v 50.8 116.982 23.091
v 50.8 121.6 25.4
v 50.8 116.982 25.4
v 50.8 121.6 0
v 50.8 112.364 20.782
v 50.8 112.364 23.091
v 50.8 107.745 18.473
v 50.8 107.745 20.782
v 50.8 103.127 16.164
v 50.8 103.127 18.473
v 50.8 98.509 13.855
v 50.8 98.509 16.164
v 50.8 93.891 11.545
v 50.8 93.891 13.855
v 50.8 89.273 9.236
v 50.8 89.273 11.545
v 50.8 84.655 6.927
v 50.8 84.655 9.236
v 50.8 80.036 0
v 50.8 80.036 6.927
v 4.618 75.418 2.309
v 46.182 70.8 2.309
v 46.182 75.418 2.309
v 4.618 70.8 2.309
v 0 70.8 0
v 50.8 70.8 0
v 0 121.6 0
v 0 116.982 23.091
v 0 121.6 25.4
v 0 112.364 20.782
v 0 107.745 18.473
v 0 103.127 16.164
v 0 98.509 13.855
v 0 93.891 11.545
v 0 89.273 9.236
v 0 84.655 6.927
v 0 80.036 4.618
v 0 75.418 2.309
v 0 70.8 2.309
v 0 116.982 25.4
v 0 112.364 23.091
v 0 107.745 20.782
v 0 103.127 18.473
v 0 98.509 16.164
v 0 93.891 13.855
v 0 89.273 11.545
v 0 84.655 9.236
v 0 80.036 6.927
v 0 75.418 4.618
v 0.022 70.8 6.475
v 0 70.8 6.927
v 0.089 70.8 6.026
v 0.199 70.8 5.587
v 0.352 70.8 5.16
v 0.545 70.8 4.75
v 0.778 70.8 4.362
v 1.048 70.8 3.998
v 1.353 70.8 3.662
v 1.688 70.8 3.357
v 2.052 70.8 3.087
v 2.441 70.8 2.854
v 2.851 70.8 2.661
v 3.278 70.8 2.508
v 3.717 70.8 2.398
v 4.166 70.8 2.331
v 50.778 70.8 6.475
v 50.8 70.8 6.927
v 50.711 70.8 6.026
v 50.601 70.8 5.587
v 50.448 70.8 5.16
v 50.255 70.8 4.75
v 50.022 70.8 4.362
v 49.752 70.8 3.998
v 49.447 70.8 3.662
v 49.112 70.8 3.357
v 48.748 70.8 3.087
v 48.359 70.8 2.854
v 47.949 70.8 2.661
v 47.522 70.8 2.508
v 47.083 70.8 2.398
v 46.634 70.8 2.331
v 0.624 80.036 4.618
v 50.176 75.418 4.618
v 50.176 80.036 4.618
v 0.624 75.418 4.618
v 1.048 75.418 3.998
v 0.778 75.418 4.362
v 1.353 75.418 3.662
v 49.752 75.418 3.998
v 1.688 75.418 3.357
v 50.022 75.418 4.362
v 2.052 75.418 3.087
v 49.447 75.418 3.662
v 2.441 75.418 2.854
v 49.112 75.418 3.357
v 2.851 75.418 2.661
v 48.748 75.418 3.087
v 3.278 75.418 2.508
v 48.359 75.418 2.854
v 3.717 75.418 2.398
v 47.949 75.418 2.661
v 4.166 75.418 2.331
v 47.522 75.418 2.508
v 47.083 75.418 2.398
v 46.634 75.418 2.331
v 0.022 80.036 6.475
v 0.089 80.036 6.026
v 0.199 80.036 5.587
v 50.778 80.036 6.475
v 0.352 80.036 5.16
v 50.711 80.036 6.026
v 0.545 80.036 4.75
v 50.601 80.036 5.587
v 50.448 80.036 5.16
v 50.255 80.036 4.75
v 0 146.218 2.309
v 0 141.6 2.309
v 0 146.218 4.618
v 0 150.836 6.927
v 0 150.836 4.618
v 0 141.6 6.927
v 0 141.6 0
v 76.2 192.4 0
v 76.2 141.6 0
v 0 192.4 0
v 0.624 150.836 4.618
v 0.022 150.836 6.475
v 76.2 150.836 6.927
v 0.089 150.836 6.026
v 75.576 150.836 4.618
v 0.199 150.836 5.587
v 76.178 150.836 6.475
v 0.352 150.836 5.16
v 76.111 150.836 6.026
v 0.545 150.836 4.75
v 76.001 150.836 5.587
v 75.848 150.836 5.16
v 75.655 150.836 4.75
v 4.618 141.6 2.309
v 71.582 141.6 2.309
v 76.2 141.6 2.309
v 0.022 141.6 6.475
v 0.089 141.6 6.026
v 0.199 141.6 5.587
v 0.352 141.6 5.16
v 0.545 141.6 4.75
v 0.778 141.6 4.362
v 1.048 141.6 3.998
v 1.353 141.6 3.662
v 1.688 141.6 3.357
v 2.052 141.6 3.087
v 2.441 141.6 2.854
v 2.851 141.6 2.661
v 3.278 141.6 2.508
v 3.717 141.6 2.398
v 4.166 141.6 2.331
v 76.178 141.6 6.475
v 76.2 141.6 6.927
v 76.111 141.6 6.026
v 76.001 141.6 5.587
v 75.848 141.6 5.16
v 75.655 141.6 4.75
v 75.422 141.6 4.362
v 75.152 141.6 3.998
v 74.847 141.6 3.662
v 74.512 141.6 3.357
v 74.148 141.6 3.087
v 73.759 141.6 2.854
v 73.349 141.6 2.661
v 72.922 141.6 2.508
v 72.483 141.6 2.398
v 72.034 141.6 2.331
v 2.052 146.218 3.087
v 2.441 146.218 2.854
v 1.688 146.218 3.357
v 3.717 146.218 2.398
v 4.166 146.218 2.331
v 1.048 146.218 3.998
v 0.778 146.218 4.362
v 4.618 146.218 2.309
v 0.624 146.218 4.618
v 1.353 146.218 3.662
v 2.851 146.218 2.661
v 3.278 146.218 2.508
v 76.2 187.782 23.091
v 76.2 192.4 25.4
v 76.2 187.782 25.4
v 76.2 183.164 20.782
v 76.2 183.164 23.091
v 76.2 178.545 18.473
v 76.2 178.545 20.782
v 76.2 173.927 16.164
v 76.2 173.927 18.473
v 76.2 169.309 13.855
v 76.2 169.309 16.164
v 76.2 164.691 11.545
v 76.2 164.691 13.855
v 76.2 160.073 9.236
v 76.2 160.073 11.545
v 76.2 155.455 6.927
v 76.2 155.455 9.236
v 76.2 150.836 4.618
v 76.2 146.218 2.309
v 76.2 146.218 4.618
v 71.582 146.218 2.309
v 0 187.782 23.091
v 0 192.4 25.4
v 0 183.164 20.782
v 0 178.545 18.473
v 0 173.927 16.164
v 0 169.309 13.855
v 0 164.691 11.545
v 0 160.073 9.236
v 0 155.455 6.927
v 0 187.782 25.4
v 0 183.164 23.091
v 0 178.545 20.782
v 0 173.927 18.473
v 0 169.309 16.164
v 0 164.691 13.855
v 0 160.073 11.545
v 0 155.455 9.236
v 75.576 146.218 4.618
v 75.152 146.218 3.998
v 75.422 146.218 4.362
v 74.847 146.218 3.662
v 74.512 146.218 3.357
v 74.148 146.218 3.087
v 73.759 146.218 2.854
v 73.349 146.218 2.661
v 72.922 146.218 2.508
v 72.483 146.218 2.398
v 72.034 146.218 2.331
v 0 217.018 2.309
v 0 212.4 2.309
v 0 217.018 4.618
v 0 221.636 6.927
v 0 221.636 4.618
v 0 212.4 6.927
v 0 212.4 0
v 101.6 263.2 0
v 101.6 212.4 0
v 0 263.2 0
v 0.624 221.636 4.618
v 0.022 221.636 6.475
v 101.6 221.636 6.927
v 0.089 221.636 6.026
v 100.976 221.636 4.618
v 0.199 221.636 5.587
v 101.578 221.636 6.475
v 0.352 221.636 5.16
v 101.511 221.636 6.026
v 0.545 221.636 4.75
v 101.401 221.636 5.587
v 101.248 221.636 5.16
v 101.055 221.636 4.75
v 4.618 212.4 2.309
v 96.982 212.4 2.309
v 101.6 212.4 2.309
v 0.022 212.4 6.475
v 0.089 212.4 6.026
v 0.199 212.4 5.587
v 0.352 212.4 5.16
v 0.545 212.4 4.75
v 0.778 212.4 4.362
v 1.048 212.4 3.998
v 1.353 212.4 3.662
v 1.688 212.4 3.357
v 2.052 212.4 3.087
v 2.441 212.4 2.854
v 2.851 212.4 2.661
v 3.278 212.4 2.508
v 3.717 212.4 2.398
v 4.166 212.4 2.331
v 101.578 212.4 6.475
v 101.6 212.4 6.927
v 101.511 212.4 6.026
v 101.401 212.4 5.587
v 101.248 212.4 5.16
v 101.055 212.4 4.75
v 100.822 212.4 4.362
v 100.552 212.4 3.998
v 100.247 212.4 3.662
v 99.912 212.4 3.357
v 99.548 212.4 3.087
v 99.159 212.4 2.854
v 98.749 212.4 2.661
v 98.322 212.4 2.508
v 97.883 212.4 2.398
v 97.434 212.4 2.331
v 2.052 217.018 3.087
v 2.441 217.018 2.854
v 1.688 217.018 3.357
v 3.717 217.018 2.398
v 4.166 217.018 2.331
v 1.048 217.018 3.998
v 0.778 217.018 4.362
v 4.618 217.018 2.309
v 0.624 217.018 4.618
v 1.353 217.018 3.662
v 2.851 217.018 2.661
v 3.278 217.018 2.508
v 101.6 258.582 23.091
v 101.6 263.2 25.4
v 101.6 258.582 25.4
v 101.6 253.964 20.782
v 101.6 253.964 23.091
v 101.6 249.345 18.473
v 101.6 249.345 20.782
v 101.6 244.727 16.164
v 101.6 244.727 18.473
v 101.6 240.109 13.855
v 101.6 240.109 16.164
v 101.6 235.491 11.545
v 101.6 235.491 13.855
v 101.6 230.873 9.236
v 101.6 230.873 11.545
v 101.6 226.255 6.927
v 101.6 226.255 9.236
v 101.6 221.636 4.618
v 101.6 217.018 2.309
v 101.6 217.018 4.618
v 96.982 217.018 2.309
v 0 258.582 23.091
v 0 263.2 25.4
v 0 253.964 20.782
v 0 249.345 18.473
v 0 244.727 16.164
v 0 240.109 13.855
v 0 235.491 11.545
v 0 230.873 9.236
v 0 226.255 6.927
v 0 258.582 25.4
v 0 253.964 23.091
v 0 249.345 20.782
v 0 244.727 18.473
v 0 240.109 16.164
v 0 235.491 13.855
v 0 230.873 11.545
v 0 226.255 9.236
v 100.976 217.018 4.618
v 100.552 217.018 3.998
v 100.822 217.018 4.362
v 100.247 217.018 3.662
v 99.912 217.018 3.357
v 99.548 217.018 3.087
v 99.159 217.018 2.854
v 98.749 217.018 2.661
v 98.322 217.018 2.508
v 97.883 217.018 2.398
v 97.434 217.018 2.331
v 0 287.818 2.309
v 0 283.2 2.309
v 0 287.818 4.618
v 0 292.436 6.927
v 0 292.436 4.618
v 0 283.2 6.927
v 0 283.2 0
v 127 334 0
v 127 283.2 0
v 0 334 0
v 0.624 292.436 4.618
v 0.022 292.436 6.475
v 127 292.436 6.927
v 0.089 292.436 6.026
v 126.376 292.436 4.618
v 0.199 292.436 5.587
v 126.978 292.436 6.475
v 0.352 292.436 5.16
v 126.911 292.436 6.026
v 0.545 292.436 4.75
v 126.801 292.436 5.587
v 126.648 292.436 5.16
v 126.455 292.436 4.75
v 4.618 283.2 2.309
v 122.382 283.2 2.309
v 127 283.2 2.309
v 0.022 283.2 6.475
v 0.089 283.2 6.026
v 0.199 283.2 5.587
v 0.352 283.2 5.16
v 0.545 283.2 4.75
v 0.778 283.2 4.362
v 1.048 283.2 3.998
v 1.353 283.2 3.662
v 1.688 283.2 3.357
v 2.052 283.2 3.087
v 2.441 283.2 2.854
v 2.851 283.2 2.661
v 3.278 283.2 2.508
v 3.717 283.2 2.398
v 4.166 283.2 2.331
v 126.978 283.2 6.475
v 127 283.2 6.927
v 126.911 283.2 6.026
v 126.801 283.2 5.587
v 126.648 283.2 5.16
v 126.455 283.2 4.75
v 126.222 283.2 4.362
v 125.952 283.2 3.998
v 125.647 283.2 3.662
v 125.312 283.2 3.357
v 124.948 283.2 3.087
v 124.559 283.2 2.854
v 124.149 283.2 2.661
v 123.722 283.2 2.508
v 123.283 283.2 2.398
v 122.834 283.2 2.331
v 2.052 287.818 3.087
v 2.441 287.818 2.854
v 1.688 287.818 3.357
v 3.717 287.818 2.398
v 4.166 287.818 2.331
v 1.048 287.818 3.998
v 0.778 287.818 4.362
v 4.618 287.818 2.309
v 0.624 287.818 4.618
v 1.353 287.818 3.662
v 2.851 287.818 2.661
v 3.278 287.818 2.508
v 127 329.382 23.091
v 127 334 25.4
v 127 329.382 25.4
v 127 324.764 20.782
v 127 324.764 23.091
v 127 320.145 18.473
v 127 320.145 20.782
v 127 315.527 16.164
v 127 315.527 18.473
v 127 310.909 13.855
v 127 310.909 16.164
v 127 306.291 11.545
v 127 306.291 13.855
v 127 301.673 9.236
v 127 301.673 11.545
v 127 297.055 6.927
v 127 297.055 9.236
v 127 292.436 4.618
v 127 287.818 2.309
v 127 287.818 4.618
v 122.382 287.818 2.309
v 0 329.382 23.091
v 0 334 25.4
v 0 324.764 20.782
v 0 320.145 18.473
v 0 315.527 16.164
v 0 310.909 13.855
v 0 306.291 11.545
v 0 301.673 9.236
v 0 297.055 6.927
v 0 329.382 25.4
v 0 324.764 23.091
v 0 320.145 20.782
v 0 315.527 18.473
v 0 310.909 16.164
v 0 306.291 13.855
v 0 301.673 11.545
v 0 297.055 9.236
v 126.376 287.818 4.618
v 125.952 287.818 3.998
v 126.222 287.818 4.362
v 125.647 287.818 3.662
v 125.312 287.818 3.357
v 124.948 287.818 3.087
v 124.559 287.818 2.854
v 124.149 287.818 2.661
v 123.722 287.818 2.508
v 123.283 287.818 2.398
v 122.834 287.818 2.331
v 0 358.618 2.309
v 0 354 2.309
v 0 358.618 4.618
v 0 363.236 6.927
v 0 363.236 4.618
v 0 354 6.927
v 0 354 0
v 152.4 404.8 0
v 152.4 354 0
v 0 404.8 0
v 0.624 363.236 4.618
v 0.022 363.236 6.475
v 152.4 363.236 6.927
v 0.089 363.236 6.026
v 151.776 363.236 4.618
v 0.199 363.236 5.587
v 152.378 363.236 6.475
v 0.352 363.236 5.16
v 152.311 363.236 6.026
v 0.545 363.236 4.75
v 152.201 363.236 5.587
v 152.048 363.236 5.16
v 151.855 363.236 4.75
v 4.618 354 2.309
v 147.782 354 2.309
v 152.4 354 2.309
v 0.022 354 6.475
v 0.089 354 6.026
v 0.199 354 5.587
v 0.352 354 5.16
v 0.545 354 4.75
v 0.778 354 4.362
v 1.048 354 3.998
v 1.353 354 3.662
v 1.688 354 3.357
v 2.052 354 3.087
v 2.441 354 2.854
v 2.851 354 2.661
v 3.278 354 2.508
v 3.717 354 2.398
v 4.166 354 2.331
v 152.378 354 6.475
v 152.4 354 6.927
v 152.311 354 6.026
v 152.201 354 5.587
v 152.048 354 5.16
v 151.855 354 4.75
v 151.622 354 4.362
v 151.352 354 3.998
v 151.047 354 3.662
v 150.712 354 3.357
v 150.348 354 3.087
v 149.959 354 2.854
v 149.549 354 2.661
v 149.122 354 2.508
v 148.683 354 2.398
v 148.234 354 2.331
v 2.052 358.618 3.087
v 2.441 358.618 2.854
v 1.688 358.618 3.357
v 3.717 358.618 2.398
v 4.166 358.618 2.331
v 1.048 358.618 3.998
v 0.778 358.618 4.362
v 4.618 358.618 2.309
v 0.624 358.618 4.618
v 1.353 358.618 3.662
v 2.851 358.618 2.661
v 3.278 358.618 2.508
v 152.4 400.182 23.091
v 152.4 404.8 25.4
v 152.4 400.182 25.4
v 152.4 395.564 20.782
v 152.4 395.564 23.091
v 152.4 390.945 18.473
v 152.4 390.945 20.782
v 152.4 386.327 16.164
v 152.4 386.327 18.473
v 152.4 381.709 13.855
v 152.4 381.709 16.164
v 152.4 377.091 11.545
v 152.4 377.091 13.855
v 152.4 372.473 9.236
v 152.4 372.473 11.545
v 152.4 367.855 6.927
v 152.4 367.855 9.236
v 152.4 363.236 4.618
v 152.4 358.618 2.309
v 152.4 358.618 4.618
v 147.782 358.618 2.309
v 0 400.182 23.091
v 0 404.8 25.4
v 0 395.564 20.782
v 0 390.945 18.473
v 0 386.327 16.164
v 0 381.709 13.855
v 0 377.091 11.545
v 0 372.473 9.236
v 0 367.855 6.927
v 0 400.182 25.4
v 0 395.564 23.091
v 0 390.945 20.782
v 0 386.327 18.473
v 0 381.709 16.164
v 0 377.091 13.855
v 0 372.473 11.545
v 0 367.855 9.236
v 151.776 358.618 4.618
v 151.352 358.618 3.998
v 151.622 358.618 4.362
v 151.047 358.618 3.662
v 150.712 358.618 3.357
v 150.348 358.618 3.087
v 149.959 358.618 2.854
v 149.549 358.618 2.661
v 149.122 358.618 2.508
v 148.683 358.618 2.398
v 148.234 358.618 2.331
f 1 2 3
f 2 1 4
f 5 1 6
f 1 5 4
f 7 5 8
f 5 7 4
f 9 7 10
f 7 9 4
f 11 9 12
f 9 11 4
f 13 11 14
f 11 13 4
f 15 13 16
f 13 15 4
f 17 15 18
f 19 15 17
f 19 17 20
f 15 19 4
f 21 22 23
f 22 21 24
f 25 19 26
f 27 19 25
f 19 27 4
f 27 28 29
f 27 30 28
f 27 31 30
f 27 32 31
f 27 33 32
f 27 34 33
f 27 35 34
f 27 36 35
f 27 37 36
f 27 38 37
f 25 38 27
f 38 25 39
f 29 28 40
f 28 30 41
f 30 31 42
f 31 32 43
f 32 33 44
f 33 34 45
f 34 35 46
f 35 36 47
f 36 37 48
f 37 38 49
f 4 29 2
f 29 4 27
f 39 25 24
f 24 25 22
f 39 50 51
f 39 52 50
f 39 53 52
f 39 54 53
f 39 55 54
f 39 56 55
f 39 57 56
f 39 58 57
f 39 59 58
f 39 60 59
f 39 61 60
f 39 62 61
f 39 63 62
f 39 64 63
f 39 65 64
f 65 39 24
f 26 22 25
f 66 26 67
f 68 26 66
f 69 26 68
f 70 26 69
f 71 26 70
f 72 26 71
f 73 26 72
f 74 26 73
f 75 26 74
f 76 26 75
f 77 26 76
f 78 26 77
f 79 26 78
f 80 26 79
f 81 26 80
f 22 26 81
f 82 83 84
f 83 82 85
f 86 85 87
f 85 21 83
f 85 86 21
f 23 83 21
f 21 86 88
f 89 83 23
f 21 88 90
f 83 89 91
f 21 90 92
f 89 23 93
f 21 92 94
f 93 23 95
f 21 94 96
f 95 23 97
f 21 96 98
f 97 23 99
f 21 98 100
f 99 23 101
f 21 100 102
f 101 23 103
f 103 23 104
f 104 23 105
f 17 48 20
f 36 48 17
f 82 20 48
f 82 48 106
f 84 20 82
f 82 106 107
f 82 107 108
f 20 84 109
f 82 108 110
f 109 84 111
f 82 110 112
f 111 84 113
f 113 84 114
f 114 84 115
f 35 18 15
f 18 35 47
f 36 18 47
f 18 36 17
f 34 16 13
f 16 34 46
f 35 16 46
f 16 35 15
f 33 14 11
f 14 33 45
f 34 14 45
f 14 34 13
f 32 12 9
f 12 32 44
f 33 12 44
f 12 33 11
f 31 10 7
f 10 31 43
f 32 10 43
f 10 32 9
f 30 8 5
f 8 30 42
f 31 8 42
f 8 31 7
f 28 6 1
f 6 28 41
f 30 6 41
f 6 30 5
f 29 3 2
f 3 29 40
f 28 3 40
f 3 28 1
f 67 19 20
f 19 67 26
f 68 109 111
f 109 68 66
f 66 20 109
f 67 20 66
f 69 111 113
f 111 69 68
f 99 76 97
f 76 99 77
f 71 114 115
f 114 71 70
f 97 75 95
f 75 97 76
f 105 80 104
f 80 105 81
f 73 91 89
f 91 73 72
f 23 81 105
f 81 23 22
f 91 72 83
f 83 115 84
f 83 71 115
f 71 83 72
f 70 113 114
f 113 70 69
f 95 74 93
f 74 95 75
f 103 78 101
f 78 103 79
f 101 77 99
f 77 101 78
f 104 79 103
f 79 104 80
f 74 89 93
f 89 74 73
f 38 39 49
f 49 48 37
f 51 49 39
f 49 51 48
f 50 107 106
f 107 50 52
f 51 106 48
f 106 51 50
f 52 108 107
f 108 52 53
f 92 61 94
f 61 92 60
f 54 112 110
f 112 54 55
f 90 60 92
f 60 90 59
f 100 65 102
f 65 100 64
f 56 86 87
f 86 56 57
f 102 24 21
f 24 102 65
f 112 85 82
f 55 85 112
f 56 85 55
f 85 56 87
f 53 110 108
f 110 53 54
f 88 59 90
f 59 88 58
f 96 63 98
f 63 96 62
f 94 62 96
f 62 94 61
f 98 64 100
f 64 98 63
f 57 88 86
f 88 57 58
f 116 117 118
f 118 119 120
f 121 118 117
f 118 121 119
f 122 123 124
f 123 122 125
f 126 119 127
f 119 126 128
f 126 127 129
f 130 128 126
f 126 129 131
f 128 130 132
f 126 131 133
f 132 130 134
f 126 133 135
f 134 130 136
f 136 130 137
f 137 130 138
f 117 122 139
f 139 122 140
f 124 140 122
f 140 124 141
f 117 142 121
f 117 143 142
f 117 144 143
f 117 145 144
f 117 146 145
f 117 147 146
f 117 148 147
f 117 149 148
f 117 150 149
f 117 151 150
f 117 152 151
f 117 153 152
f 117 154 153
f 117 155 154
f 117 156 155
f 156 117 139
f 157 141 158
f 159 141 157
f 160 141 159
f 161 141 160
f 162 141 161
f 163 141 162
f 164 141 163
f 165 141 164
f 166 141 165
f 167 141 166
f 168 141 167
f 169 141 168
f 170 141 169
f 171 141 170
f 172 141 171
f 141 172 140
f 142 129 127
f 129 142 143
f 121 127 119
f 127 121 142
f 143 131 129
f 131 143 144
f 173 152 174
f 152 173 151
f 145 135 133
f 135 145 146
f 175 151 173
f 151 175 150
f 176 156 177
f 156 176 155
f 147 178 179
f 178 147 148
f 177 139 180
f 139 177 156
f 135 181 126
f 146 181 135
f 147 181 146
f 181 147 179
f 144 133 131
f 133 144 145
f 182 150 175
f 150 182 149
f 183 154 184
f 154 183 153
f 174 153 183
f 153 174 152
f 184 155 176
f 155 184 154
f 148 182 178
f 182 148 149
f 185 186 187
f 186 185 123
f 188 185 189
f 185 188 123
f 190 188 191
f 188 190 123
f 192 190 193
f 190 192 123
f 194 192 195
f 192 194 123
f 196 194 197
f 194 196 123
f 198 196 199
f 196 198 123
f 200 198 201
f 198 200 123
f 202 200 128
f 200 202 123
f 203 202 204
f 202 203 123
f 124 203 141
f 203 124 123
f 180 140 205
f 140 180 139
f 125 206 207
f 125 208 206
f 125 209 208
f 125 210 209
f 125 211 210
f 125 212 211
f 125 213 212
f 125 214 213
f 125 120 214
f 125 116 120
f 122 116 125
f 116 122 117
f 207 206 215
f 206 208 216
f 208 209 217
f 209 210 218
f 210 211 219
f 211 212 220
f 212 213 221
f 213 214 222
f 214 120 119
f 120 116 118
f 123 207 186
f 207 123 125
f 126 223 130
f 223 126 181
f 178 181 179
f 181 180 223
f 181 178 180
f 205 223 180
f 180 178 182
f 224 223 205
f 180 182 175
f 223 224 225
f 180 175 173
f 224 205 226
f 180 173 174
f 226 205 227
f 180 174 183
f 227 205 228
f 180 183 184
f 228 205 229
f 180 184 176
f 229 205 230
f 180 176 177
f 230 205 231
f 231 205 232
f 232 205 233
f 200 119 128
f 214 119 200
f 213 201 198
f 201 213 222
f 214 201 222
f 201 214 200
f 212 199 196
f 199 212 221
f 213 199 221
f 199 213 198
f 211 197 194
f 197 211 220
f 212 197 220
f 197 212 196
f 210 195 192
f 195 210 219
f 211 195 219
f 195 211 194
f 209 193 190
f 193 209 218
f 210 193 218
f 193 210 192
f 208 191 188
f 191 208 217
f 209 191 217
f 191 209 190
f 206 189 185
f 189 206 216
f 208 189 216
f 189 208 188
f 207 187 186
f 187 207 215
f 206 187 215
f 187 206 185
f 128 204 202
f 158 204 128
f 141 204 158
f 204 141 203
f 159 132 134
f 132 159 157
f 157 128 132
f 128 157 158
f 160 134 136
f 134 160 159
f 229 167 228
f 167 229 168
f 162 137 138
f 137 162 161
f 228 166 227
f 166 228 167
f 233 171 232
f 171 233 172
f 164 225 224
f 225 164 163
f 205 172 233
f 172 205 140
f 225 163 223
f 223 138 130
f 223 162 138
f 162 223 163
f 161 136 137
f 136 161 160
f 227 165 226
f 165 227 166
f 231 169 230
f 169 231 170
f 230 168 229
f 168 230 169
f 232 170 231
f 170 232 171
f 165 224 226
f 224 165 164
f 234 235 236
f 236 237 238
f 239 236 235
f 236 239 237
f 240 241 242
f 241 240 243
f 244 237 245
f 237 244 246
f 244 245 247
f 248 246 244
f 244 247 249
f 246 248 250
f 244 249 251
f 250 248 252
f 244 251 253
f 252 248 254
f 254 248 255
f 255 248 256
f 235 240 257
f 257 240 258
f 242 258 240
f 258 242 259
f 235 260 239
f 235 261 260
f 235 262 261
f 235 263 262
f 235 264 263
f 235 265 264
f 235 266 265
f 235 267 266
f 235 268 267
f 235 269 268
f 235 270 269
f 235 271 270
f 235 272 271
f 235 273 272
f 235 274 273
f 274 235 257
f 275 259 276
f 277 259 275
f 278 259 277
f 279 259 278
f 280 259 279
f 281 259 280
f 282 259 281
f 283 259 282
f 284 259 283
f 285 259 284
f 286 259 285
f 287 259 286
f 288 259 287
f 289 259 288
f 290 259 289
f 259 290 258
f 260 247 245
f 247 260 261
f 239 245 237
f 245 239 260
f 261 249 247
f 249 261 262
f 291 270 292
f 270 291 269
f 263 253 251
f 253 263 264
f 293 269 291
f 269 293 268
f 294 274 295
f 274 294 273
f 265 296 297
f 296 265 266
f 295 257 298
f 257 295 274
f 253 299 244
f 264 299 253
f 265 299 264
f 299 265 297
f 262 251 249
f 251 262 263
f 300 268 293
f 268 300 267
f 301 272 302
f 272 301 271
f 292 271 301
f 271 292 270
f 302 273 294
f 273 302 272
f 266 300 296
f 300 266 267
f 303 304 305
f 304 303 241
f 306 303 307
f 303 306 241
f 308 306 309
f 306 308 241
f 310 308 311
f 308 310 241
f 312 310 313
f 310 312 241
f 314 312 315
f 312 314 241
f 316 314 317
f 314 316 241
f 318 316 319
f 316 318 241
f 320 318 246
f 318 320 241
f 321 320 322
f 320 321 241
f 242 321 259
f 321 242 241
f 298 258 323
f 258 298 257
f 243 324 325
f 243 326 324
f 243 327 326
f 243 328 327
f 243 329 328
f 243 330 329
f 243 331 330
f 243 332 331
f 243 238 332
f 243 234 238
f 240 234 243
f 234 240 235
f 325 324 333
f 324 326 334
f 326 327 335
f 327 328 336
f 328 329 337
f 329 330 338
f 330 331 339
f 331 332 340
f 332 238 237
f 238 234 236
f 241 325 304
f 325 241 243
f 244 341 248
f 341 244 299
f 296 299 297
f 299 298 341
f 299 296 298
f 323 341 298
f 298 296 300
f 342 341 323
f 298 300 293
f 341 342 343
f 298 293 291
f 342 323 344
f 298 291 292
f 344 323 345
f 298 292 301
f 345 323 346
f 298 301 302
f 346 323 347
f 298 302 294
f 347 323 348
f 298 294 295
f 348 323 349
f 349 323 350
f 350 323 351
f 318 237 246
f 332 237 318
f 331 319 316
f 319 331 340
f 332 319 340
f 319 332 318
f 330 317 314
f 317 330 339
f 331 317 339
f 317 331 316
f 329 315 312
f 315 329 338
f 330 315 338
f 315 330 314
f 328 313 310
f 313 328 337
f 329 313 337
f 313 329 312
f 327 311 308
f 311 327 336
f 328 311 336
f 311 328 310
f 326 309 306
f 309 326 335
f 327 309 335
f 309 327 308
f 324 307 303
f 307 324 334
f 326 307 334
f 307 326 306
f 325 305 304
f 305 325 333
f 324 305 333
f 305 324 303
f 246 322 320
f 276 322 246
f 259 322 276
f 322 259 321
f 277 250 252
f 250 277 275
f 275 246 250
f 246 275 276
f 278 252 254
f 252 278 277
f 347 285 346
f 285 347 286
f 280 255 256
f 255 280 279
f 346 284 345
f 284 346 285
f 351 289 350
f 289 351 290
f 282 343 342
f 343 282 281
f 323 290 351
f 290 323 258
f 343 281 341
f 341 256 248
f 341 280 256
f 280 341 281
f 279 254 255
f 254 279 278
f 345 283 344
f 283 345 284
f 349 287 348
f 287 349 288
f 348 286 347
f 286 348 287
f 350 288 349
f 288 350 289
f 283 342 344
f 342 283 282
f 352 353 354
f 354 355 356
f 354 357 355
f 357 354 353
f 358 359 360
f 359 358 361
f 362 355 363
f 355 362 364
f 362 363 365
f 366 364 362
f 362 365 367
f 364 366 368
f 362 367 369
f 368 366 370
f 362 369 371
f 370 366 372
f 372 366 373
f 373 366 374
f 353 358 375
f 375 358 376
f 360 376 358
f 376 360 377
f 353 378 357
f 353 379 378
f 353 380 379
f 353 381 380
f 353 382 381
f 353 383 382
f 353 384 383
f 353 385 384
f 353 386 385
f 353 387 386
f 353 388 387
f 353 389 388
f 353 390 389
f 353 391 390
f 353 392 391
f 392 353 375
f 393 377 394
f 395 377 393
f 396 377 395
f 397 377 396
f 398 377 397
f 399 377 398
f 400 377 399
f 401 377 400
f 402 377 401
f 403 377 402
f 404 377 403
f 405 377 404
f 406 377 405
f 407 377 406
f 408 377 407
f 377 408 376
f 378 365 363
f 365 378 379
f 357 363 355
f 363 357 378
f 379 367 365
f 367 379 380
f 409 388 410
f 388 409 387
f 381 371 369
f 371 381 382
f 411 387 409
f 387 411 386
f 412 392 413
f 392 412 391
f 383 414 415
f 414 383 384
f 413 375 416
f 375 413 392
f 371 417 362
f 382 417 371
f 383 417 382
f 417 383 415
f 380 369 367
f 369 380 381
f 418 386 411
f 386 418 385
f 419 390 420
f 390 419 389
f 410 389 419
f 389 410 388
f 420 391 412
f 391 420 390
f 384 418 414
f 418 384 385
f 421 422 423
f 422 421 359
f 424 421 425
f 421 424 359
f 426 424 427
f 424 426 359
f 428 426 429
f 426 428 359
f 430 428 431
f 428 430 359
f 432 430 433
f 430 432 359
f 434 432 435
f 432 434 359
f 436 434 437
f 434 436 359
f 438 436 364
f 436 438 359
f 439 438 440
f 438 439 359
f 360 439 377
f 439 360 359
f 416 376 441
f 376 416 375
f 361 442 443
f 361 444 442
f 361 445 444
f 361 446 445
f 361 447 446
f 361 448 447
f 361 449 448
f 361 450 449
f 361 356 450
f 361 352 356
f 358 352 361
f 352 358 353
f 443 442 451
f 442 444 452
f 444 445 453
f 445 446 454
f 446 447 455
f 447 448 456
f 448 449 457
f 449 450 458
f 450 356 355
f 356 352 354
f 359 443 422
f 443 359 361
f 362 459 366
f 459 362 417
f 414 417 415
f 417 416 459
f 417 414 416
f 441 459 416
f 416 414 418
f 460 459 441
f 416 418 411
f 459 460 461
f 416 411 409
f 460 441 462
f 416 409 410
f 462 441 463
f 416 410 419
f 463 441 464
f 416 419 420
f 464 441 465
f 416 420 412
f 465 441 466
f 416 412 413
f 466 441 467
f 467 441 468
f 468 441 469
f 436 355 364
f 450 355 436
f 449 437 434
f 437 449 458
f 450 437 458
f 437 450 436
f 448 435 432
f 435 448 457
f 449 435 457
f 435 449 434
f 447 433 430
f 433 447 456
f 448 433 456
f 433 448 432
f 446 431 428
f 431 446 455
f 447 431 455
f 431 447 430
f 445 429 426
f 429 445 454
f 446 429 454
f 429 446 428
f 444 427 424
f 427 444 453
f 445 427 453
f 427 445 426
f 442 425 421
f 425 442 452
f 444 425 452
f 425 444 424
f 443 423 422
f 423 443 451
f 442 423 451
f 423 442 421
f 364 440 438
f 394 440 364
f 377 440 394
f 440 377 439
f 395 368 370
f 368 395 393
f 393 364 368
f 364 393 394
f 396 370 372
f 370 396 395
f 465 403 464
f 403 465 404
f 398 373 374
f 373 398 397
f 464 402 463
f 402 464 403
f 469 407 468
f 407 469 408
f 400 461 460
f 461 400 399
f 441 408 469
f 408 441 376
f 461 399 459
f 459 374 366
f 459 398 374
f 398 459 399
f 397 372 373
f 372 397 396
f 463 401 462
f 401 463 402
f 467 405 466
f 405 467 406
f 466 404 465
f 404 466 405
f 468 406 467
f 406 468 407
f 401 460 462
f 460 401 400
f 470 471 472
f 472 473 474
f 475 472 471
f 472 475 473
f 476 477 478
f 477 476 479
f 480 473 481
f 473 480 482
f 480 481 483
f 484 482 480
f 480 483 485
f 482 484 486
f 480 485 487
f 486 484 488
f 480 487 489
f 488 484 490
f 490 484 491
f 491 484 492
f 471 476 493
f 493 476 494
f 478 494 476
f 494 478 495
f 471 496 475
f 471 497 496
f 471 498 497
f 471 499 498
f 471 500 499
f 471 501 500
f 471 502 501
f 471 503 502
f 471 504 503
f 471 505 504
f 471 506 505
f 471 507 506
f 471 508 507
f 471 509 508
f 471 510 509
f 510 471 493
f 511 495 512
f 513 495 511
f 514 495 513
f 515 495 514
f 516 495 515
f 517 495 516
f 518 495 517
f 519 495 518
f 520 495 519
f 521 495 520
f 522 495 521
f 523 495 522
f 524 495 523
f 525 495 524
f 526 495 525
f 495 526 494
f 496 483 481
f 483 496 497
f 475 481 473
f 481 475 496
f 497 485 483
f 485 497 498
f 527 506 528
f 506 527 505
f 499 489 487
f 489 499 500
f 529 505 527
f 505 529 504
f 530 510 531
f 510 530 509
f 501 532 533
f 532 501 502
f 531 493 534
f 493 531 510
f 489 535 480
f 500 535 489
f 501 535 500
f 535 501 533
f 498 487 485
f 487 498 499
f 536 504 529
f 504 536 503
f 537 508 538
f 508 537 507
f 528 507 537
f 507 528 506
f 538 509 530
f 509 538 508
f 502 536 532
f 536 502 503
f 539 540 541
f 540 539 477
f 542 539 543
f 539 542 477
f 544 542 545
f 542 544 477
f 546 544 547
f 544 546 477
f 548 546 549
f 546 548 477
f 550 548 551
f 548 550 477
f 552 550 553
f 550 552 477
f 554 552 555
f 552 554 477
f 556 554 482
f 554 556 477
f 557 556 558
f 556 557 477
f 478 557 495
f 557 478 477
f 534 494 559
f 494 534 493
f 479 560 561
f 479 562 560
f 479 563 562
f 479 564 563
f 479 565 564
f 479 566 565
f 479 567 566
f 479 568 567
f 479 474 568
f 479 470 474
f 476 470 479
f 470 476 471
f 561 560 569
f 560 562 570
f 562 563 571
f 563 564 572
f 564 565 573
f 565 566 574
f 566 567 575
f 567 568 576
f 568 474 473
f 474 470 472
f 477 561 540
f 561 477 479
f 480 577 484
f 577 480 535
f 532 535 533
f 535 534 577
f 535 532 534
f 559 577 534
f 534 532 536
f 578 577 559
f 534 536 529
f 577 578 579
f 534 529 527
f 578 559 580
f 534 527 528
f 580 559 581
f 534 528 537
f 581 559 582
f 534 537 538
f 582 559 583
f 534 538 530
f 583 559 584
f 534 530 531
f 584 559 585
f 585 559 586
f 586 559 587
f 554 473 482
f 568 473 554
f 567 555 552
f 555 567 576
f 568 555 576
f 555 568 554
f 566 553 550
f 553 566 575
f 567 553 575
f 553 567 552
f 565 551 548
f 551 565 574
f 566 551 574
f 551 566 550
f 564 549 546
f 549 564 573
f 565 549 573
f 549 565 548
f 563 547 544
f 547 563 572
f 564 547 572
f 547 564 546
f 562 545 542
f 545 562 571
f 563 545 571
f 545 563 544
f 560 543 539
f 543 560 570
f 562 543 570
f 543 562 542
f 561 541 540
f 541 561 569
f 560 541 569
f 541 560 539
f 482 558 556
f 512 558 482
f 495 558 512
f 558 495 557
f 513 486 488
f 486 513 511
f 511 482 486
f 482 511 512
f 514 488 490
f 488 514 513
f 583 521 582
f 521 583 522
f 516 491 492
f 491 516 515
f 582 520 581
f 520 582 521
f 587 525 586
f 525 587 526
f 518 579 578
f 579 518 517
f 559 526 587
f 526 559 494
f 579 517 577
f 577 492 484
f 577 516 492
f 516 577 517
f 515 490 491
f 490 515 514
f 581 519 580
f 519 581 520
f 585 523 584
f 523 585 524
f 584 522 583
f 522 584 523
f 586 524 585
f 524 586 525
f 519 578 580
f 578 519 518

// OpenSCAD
// file: constants.scad
inchRatio = 25.4;
nozzelThickness = 0.4;
subUnitSide = 6 * inchRatio;


unitHeight = 1 * inchRatio;
// stepHeight = unitHeight / 12;
stepHeight = unitHeight / 11;
stepTred = (2 * unitHeight) / 11;

$fn = $preview ? 32 : 64;


capHeight = 2 * stepHeight;
capWidth = 4 * nozzelThickness;
taperHeight = .75;
taperWidth = stepTred;

default_wall = 2;


// how thick to make the continuous flat surface of the wall
facadeThickness = 1;
capEdgeDepth = stepTred * 1.5;
// main file
include<constants.scad>


//steps();

// cap factory

for (a =[2:6]) {
    translate([0, (a-1) * (2 * unitHeight + 20),0]) 
   steps(a);
}


// footerInterface();

module steps(units = 4) {

    depth = 2 * unitHeight;
    width = units * unitHeight;

    for(i = [0 : 1 : 11]) {
        translate([0,i*stepTred, 0]) 
        cube([width, depth- i*stepTred, (i + 1) * stepHeight]) ;
    }

    translate([width-stepTred,0,0]) 
    footerInterface ();

    translate([stepTred,0,0]) 
    mirror([1,0,0]) 
    footerInterface ();


}



module footerInterface() {
    interfaceLength = 2 * stepTred;

    difference() {
        cube([stepTred,interfaceLength, 3 *stepHeight]) ;
        translate([0,-0.5, stepHeight + stepTred]) {
            rotate([-90,0,0])  {
                cylinder(interfaceLength + 1, r = stepTred);
            }
        }
    }
}
